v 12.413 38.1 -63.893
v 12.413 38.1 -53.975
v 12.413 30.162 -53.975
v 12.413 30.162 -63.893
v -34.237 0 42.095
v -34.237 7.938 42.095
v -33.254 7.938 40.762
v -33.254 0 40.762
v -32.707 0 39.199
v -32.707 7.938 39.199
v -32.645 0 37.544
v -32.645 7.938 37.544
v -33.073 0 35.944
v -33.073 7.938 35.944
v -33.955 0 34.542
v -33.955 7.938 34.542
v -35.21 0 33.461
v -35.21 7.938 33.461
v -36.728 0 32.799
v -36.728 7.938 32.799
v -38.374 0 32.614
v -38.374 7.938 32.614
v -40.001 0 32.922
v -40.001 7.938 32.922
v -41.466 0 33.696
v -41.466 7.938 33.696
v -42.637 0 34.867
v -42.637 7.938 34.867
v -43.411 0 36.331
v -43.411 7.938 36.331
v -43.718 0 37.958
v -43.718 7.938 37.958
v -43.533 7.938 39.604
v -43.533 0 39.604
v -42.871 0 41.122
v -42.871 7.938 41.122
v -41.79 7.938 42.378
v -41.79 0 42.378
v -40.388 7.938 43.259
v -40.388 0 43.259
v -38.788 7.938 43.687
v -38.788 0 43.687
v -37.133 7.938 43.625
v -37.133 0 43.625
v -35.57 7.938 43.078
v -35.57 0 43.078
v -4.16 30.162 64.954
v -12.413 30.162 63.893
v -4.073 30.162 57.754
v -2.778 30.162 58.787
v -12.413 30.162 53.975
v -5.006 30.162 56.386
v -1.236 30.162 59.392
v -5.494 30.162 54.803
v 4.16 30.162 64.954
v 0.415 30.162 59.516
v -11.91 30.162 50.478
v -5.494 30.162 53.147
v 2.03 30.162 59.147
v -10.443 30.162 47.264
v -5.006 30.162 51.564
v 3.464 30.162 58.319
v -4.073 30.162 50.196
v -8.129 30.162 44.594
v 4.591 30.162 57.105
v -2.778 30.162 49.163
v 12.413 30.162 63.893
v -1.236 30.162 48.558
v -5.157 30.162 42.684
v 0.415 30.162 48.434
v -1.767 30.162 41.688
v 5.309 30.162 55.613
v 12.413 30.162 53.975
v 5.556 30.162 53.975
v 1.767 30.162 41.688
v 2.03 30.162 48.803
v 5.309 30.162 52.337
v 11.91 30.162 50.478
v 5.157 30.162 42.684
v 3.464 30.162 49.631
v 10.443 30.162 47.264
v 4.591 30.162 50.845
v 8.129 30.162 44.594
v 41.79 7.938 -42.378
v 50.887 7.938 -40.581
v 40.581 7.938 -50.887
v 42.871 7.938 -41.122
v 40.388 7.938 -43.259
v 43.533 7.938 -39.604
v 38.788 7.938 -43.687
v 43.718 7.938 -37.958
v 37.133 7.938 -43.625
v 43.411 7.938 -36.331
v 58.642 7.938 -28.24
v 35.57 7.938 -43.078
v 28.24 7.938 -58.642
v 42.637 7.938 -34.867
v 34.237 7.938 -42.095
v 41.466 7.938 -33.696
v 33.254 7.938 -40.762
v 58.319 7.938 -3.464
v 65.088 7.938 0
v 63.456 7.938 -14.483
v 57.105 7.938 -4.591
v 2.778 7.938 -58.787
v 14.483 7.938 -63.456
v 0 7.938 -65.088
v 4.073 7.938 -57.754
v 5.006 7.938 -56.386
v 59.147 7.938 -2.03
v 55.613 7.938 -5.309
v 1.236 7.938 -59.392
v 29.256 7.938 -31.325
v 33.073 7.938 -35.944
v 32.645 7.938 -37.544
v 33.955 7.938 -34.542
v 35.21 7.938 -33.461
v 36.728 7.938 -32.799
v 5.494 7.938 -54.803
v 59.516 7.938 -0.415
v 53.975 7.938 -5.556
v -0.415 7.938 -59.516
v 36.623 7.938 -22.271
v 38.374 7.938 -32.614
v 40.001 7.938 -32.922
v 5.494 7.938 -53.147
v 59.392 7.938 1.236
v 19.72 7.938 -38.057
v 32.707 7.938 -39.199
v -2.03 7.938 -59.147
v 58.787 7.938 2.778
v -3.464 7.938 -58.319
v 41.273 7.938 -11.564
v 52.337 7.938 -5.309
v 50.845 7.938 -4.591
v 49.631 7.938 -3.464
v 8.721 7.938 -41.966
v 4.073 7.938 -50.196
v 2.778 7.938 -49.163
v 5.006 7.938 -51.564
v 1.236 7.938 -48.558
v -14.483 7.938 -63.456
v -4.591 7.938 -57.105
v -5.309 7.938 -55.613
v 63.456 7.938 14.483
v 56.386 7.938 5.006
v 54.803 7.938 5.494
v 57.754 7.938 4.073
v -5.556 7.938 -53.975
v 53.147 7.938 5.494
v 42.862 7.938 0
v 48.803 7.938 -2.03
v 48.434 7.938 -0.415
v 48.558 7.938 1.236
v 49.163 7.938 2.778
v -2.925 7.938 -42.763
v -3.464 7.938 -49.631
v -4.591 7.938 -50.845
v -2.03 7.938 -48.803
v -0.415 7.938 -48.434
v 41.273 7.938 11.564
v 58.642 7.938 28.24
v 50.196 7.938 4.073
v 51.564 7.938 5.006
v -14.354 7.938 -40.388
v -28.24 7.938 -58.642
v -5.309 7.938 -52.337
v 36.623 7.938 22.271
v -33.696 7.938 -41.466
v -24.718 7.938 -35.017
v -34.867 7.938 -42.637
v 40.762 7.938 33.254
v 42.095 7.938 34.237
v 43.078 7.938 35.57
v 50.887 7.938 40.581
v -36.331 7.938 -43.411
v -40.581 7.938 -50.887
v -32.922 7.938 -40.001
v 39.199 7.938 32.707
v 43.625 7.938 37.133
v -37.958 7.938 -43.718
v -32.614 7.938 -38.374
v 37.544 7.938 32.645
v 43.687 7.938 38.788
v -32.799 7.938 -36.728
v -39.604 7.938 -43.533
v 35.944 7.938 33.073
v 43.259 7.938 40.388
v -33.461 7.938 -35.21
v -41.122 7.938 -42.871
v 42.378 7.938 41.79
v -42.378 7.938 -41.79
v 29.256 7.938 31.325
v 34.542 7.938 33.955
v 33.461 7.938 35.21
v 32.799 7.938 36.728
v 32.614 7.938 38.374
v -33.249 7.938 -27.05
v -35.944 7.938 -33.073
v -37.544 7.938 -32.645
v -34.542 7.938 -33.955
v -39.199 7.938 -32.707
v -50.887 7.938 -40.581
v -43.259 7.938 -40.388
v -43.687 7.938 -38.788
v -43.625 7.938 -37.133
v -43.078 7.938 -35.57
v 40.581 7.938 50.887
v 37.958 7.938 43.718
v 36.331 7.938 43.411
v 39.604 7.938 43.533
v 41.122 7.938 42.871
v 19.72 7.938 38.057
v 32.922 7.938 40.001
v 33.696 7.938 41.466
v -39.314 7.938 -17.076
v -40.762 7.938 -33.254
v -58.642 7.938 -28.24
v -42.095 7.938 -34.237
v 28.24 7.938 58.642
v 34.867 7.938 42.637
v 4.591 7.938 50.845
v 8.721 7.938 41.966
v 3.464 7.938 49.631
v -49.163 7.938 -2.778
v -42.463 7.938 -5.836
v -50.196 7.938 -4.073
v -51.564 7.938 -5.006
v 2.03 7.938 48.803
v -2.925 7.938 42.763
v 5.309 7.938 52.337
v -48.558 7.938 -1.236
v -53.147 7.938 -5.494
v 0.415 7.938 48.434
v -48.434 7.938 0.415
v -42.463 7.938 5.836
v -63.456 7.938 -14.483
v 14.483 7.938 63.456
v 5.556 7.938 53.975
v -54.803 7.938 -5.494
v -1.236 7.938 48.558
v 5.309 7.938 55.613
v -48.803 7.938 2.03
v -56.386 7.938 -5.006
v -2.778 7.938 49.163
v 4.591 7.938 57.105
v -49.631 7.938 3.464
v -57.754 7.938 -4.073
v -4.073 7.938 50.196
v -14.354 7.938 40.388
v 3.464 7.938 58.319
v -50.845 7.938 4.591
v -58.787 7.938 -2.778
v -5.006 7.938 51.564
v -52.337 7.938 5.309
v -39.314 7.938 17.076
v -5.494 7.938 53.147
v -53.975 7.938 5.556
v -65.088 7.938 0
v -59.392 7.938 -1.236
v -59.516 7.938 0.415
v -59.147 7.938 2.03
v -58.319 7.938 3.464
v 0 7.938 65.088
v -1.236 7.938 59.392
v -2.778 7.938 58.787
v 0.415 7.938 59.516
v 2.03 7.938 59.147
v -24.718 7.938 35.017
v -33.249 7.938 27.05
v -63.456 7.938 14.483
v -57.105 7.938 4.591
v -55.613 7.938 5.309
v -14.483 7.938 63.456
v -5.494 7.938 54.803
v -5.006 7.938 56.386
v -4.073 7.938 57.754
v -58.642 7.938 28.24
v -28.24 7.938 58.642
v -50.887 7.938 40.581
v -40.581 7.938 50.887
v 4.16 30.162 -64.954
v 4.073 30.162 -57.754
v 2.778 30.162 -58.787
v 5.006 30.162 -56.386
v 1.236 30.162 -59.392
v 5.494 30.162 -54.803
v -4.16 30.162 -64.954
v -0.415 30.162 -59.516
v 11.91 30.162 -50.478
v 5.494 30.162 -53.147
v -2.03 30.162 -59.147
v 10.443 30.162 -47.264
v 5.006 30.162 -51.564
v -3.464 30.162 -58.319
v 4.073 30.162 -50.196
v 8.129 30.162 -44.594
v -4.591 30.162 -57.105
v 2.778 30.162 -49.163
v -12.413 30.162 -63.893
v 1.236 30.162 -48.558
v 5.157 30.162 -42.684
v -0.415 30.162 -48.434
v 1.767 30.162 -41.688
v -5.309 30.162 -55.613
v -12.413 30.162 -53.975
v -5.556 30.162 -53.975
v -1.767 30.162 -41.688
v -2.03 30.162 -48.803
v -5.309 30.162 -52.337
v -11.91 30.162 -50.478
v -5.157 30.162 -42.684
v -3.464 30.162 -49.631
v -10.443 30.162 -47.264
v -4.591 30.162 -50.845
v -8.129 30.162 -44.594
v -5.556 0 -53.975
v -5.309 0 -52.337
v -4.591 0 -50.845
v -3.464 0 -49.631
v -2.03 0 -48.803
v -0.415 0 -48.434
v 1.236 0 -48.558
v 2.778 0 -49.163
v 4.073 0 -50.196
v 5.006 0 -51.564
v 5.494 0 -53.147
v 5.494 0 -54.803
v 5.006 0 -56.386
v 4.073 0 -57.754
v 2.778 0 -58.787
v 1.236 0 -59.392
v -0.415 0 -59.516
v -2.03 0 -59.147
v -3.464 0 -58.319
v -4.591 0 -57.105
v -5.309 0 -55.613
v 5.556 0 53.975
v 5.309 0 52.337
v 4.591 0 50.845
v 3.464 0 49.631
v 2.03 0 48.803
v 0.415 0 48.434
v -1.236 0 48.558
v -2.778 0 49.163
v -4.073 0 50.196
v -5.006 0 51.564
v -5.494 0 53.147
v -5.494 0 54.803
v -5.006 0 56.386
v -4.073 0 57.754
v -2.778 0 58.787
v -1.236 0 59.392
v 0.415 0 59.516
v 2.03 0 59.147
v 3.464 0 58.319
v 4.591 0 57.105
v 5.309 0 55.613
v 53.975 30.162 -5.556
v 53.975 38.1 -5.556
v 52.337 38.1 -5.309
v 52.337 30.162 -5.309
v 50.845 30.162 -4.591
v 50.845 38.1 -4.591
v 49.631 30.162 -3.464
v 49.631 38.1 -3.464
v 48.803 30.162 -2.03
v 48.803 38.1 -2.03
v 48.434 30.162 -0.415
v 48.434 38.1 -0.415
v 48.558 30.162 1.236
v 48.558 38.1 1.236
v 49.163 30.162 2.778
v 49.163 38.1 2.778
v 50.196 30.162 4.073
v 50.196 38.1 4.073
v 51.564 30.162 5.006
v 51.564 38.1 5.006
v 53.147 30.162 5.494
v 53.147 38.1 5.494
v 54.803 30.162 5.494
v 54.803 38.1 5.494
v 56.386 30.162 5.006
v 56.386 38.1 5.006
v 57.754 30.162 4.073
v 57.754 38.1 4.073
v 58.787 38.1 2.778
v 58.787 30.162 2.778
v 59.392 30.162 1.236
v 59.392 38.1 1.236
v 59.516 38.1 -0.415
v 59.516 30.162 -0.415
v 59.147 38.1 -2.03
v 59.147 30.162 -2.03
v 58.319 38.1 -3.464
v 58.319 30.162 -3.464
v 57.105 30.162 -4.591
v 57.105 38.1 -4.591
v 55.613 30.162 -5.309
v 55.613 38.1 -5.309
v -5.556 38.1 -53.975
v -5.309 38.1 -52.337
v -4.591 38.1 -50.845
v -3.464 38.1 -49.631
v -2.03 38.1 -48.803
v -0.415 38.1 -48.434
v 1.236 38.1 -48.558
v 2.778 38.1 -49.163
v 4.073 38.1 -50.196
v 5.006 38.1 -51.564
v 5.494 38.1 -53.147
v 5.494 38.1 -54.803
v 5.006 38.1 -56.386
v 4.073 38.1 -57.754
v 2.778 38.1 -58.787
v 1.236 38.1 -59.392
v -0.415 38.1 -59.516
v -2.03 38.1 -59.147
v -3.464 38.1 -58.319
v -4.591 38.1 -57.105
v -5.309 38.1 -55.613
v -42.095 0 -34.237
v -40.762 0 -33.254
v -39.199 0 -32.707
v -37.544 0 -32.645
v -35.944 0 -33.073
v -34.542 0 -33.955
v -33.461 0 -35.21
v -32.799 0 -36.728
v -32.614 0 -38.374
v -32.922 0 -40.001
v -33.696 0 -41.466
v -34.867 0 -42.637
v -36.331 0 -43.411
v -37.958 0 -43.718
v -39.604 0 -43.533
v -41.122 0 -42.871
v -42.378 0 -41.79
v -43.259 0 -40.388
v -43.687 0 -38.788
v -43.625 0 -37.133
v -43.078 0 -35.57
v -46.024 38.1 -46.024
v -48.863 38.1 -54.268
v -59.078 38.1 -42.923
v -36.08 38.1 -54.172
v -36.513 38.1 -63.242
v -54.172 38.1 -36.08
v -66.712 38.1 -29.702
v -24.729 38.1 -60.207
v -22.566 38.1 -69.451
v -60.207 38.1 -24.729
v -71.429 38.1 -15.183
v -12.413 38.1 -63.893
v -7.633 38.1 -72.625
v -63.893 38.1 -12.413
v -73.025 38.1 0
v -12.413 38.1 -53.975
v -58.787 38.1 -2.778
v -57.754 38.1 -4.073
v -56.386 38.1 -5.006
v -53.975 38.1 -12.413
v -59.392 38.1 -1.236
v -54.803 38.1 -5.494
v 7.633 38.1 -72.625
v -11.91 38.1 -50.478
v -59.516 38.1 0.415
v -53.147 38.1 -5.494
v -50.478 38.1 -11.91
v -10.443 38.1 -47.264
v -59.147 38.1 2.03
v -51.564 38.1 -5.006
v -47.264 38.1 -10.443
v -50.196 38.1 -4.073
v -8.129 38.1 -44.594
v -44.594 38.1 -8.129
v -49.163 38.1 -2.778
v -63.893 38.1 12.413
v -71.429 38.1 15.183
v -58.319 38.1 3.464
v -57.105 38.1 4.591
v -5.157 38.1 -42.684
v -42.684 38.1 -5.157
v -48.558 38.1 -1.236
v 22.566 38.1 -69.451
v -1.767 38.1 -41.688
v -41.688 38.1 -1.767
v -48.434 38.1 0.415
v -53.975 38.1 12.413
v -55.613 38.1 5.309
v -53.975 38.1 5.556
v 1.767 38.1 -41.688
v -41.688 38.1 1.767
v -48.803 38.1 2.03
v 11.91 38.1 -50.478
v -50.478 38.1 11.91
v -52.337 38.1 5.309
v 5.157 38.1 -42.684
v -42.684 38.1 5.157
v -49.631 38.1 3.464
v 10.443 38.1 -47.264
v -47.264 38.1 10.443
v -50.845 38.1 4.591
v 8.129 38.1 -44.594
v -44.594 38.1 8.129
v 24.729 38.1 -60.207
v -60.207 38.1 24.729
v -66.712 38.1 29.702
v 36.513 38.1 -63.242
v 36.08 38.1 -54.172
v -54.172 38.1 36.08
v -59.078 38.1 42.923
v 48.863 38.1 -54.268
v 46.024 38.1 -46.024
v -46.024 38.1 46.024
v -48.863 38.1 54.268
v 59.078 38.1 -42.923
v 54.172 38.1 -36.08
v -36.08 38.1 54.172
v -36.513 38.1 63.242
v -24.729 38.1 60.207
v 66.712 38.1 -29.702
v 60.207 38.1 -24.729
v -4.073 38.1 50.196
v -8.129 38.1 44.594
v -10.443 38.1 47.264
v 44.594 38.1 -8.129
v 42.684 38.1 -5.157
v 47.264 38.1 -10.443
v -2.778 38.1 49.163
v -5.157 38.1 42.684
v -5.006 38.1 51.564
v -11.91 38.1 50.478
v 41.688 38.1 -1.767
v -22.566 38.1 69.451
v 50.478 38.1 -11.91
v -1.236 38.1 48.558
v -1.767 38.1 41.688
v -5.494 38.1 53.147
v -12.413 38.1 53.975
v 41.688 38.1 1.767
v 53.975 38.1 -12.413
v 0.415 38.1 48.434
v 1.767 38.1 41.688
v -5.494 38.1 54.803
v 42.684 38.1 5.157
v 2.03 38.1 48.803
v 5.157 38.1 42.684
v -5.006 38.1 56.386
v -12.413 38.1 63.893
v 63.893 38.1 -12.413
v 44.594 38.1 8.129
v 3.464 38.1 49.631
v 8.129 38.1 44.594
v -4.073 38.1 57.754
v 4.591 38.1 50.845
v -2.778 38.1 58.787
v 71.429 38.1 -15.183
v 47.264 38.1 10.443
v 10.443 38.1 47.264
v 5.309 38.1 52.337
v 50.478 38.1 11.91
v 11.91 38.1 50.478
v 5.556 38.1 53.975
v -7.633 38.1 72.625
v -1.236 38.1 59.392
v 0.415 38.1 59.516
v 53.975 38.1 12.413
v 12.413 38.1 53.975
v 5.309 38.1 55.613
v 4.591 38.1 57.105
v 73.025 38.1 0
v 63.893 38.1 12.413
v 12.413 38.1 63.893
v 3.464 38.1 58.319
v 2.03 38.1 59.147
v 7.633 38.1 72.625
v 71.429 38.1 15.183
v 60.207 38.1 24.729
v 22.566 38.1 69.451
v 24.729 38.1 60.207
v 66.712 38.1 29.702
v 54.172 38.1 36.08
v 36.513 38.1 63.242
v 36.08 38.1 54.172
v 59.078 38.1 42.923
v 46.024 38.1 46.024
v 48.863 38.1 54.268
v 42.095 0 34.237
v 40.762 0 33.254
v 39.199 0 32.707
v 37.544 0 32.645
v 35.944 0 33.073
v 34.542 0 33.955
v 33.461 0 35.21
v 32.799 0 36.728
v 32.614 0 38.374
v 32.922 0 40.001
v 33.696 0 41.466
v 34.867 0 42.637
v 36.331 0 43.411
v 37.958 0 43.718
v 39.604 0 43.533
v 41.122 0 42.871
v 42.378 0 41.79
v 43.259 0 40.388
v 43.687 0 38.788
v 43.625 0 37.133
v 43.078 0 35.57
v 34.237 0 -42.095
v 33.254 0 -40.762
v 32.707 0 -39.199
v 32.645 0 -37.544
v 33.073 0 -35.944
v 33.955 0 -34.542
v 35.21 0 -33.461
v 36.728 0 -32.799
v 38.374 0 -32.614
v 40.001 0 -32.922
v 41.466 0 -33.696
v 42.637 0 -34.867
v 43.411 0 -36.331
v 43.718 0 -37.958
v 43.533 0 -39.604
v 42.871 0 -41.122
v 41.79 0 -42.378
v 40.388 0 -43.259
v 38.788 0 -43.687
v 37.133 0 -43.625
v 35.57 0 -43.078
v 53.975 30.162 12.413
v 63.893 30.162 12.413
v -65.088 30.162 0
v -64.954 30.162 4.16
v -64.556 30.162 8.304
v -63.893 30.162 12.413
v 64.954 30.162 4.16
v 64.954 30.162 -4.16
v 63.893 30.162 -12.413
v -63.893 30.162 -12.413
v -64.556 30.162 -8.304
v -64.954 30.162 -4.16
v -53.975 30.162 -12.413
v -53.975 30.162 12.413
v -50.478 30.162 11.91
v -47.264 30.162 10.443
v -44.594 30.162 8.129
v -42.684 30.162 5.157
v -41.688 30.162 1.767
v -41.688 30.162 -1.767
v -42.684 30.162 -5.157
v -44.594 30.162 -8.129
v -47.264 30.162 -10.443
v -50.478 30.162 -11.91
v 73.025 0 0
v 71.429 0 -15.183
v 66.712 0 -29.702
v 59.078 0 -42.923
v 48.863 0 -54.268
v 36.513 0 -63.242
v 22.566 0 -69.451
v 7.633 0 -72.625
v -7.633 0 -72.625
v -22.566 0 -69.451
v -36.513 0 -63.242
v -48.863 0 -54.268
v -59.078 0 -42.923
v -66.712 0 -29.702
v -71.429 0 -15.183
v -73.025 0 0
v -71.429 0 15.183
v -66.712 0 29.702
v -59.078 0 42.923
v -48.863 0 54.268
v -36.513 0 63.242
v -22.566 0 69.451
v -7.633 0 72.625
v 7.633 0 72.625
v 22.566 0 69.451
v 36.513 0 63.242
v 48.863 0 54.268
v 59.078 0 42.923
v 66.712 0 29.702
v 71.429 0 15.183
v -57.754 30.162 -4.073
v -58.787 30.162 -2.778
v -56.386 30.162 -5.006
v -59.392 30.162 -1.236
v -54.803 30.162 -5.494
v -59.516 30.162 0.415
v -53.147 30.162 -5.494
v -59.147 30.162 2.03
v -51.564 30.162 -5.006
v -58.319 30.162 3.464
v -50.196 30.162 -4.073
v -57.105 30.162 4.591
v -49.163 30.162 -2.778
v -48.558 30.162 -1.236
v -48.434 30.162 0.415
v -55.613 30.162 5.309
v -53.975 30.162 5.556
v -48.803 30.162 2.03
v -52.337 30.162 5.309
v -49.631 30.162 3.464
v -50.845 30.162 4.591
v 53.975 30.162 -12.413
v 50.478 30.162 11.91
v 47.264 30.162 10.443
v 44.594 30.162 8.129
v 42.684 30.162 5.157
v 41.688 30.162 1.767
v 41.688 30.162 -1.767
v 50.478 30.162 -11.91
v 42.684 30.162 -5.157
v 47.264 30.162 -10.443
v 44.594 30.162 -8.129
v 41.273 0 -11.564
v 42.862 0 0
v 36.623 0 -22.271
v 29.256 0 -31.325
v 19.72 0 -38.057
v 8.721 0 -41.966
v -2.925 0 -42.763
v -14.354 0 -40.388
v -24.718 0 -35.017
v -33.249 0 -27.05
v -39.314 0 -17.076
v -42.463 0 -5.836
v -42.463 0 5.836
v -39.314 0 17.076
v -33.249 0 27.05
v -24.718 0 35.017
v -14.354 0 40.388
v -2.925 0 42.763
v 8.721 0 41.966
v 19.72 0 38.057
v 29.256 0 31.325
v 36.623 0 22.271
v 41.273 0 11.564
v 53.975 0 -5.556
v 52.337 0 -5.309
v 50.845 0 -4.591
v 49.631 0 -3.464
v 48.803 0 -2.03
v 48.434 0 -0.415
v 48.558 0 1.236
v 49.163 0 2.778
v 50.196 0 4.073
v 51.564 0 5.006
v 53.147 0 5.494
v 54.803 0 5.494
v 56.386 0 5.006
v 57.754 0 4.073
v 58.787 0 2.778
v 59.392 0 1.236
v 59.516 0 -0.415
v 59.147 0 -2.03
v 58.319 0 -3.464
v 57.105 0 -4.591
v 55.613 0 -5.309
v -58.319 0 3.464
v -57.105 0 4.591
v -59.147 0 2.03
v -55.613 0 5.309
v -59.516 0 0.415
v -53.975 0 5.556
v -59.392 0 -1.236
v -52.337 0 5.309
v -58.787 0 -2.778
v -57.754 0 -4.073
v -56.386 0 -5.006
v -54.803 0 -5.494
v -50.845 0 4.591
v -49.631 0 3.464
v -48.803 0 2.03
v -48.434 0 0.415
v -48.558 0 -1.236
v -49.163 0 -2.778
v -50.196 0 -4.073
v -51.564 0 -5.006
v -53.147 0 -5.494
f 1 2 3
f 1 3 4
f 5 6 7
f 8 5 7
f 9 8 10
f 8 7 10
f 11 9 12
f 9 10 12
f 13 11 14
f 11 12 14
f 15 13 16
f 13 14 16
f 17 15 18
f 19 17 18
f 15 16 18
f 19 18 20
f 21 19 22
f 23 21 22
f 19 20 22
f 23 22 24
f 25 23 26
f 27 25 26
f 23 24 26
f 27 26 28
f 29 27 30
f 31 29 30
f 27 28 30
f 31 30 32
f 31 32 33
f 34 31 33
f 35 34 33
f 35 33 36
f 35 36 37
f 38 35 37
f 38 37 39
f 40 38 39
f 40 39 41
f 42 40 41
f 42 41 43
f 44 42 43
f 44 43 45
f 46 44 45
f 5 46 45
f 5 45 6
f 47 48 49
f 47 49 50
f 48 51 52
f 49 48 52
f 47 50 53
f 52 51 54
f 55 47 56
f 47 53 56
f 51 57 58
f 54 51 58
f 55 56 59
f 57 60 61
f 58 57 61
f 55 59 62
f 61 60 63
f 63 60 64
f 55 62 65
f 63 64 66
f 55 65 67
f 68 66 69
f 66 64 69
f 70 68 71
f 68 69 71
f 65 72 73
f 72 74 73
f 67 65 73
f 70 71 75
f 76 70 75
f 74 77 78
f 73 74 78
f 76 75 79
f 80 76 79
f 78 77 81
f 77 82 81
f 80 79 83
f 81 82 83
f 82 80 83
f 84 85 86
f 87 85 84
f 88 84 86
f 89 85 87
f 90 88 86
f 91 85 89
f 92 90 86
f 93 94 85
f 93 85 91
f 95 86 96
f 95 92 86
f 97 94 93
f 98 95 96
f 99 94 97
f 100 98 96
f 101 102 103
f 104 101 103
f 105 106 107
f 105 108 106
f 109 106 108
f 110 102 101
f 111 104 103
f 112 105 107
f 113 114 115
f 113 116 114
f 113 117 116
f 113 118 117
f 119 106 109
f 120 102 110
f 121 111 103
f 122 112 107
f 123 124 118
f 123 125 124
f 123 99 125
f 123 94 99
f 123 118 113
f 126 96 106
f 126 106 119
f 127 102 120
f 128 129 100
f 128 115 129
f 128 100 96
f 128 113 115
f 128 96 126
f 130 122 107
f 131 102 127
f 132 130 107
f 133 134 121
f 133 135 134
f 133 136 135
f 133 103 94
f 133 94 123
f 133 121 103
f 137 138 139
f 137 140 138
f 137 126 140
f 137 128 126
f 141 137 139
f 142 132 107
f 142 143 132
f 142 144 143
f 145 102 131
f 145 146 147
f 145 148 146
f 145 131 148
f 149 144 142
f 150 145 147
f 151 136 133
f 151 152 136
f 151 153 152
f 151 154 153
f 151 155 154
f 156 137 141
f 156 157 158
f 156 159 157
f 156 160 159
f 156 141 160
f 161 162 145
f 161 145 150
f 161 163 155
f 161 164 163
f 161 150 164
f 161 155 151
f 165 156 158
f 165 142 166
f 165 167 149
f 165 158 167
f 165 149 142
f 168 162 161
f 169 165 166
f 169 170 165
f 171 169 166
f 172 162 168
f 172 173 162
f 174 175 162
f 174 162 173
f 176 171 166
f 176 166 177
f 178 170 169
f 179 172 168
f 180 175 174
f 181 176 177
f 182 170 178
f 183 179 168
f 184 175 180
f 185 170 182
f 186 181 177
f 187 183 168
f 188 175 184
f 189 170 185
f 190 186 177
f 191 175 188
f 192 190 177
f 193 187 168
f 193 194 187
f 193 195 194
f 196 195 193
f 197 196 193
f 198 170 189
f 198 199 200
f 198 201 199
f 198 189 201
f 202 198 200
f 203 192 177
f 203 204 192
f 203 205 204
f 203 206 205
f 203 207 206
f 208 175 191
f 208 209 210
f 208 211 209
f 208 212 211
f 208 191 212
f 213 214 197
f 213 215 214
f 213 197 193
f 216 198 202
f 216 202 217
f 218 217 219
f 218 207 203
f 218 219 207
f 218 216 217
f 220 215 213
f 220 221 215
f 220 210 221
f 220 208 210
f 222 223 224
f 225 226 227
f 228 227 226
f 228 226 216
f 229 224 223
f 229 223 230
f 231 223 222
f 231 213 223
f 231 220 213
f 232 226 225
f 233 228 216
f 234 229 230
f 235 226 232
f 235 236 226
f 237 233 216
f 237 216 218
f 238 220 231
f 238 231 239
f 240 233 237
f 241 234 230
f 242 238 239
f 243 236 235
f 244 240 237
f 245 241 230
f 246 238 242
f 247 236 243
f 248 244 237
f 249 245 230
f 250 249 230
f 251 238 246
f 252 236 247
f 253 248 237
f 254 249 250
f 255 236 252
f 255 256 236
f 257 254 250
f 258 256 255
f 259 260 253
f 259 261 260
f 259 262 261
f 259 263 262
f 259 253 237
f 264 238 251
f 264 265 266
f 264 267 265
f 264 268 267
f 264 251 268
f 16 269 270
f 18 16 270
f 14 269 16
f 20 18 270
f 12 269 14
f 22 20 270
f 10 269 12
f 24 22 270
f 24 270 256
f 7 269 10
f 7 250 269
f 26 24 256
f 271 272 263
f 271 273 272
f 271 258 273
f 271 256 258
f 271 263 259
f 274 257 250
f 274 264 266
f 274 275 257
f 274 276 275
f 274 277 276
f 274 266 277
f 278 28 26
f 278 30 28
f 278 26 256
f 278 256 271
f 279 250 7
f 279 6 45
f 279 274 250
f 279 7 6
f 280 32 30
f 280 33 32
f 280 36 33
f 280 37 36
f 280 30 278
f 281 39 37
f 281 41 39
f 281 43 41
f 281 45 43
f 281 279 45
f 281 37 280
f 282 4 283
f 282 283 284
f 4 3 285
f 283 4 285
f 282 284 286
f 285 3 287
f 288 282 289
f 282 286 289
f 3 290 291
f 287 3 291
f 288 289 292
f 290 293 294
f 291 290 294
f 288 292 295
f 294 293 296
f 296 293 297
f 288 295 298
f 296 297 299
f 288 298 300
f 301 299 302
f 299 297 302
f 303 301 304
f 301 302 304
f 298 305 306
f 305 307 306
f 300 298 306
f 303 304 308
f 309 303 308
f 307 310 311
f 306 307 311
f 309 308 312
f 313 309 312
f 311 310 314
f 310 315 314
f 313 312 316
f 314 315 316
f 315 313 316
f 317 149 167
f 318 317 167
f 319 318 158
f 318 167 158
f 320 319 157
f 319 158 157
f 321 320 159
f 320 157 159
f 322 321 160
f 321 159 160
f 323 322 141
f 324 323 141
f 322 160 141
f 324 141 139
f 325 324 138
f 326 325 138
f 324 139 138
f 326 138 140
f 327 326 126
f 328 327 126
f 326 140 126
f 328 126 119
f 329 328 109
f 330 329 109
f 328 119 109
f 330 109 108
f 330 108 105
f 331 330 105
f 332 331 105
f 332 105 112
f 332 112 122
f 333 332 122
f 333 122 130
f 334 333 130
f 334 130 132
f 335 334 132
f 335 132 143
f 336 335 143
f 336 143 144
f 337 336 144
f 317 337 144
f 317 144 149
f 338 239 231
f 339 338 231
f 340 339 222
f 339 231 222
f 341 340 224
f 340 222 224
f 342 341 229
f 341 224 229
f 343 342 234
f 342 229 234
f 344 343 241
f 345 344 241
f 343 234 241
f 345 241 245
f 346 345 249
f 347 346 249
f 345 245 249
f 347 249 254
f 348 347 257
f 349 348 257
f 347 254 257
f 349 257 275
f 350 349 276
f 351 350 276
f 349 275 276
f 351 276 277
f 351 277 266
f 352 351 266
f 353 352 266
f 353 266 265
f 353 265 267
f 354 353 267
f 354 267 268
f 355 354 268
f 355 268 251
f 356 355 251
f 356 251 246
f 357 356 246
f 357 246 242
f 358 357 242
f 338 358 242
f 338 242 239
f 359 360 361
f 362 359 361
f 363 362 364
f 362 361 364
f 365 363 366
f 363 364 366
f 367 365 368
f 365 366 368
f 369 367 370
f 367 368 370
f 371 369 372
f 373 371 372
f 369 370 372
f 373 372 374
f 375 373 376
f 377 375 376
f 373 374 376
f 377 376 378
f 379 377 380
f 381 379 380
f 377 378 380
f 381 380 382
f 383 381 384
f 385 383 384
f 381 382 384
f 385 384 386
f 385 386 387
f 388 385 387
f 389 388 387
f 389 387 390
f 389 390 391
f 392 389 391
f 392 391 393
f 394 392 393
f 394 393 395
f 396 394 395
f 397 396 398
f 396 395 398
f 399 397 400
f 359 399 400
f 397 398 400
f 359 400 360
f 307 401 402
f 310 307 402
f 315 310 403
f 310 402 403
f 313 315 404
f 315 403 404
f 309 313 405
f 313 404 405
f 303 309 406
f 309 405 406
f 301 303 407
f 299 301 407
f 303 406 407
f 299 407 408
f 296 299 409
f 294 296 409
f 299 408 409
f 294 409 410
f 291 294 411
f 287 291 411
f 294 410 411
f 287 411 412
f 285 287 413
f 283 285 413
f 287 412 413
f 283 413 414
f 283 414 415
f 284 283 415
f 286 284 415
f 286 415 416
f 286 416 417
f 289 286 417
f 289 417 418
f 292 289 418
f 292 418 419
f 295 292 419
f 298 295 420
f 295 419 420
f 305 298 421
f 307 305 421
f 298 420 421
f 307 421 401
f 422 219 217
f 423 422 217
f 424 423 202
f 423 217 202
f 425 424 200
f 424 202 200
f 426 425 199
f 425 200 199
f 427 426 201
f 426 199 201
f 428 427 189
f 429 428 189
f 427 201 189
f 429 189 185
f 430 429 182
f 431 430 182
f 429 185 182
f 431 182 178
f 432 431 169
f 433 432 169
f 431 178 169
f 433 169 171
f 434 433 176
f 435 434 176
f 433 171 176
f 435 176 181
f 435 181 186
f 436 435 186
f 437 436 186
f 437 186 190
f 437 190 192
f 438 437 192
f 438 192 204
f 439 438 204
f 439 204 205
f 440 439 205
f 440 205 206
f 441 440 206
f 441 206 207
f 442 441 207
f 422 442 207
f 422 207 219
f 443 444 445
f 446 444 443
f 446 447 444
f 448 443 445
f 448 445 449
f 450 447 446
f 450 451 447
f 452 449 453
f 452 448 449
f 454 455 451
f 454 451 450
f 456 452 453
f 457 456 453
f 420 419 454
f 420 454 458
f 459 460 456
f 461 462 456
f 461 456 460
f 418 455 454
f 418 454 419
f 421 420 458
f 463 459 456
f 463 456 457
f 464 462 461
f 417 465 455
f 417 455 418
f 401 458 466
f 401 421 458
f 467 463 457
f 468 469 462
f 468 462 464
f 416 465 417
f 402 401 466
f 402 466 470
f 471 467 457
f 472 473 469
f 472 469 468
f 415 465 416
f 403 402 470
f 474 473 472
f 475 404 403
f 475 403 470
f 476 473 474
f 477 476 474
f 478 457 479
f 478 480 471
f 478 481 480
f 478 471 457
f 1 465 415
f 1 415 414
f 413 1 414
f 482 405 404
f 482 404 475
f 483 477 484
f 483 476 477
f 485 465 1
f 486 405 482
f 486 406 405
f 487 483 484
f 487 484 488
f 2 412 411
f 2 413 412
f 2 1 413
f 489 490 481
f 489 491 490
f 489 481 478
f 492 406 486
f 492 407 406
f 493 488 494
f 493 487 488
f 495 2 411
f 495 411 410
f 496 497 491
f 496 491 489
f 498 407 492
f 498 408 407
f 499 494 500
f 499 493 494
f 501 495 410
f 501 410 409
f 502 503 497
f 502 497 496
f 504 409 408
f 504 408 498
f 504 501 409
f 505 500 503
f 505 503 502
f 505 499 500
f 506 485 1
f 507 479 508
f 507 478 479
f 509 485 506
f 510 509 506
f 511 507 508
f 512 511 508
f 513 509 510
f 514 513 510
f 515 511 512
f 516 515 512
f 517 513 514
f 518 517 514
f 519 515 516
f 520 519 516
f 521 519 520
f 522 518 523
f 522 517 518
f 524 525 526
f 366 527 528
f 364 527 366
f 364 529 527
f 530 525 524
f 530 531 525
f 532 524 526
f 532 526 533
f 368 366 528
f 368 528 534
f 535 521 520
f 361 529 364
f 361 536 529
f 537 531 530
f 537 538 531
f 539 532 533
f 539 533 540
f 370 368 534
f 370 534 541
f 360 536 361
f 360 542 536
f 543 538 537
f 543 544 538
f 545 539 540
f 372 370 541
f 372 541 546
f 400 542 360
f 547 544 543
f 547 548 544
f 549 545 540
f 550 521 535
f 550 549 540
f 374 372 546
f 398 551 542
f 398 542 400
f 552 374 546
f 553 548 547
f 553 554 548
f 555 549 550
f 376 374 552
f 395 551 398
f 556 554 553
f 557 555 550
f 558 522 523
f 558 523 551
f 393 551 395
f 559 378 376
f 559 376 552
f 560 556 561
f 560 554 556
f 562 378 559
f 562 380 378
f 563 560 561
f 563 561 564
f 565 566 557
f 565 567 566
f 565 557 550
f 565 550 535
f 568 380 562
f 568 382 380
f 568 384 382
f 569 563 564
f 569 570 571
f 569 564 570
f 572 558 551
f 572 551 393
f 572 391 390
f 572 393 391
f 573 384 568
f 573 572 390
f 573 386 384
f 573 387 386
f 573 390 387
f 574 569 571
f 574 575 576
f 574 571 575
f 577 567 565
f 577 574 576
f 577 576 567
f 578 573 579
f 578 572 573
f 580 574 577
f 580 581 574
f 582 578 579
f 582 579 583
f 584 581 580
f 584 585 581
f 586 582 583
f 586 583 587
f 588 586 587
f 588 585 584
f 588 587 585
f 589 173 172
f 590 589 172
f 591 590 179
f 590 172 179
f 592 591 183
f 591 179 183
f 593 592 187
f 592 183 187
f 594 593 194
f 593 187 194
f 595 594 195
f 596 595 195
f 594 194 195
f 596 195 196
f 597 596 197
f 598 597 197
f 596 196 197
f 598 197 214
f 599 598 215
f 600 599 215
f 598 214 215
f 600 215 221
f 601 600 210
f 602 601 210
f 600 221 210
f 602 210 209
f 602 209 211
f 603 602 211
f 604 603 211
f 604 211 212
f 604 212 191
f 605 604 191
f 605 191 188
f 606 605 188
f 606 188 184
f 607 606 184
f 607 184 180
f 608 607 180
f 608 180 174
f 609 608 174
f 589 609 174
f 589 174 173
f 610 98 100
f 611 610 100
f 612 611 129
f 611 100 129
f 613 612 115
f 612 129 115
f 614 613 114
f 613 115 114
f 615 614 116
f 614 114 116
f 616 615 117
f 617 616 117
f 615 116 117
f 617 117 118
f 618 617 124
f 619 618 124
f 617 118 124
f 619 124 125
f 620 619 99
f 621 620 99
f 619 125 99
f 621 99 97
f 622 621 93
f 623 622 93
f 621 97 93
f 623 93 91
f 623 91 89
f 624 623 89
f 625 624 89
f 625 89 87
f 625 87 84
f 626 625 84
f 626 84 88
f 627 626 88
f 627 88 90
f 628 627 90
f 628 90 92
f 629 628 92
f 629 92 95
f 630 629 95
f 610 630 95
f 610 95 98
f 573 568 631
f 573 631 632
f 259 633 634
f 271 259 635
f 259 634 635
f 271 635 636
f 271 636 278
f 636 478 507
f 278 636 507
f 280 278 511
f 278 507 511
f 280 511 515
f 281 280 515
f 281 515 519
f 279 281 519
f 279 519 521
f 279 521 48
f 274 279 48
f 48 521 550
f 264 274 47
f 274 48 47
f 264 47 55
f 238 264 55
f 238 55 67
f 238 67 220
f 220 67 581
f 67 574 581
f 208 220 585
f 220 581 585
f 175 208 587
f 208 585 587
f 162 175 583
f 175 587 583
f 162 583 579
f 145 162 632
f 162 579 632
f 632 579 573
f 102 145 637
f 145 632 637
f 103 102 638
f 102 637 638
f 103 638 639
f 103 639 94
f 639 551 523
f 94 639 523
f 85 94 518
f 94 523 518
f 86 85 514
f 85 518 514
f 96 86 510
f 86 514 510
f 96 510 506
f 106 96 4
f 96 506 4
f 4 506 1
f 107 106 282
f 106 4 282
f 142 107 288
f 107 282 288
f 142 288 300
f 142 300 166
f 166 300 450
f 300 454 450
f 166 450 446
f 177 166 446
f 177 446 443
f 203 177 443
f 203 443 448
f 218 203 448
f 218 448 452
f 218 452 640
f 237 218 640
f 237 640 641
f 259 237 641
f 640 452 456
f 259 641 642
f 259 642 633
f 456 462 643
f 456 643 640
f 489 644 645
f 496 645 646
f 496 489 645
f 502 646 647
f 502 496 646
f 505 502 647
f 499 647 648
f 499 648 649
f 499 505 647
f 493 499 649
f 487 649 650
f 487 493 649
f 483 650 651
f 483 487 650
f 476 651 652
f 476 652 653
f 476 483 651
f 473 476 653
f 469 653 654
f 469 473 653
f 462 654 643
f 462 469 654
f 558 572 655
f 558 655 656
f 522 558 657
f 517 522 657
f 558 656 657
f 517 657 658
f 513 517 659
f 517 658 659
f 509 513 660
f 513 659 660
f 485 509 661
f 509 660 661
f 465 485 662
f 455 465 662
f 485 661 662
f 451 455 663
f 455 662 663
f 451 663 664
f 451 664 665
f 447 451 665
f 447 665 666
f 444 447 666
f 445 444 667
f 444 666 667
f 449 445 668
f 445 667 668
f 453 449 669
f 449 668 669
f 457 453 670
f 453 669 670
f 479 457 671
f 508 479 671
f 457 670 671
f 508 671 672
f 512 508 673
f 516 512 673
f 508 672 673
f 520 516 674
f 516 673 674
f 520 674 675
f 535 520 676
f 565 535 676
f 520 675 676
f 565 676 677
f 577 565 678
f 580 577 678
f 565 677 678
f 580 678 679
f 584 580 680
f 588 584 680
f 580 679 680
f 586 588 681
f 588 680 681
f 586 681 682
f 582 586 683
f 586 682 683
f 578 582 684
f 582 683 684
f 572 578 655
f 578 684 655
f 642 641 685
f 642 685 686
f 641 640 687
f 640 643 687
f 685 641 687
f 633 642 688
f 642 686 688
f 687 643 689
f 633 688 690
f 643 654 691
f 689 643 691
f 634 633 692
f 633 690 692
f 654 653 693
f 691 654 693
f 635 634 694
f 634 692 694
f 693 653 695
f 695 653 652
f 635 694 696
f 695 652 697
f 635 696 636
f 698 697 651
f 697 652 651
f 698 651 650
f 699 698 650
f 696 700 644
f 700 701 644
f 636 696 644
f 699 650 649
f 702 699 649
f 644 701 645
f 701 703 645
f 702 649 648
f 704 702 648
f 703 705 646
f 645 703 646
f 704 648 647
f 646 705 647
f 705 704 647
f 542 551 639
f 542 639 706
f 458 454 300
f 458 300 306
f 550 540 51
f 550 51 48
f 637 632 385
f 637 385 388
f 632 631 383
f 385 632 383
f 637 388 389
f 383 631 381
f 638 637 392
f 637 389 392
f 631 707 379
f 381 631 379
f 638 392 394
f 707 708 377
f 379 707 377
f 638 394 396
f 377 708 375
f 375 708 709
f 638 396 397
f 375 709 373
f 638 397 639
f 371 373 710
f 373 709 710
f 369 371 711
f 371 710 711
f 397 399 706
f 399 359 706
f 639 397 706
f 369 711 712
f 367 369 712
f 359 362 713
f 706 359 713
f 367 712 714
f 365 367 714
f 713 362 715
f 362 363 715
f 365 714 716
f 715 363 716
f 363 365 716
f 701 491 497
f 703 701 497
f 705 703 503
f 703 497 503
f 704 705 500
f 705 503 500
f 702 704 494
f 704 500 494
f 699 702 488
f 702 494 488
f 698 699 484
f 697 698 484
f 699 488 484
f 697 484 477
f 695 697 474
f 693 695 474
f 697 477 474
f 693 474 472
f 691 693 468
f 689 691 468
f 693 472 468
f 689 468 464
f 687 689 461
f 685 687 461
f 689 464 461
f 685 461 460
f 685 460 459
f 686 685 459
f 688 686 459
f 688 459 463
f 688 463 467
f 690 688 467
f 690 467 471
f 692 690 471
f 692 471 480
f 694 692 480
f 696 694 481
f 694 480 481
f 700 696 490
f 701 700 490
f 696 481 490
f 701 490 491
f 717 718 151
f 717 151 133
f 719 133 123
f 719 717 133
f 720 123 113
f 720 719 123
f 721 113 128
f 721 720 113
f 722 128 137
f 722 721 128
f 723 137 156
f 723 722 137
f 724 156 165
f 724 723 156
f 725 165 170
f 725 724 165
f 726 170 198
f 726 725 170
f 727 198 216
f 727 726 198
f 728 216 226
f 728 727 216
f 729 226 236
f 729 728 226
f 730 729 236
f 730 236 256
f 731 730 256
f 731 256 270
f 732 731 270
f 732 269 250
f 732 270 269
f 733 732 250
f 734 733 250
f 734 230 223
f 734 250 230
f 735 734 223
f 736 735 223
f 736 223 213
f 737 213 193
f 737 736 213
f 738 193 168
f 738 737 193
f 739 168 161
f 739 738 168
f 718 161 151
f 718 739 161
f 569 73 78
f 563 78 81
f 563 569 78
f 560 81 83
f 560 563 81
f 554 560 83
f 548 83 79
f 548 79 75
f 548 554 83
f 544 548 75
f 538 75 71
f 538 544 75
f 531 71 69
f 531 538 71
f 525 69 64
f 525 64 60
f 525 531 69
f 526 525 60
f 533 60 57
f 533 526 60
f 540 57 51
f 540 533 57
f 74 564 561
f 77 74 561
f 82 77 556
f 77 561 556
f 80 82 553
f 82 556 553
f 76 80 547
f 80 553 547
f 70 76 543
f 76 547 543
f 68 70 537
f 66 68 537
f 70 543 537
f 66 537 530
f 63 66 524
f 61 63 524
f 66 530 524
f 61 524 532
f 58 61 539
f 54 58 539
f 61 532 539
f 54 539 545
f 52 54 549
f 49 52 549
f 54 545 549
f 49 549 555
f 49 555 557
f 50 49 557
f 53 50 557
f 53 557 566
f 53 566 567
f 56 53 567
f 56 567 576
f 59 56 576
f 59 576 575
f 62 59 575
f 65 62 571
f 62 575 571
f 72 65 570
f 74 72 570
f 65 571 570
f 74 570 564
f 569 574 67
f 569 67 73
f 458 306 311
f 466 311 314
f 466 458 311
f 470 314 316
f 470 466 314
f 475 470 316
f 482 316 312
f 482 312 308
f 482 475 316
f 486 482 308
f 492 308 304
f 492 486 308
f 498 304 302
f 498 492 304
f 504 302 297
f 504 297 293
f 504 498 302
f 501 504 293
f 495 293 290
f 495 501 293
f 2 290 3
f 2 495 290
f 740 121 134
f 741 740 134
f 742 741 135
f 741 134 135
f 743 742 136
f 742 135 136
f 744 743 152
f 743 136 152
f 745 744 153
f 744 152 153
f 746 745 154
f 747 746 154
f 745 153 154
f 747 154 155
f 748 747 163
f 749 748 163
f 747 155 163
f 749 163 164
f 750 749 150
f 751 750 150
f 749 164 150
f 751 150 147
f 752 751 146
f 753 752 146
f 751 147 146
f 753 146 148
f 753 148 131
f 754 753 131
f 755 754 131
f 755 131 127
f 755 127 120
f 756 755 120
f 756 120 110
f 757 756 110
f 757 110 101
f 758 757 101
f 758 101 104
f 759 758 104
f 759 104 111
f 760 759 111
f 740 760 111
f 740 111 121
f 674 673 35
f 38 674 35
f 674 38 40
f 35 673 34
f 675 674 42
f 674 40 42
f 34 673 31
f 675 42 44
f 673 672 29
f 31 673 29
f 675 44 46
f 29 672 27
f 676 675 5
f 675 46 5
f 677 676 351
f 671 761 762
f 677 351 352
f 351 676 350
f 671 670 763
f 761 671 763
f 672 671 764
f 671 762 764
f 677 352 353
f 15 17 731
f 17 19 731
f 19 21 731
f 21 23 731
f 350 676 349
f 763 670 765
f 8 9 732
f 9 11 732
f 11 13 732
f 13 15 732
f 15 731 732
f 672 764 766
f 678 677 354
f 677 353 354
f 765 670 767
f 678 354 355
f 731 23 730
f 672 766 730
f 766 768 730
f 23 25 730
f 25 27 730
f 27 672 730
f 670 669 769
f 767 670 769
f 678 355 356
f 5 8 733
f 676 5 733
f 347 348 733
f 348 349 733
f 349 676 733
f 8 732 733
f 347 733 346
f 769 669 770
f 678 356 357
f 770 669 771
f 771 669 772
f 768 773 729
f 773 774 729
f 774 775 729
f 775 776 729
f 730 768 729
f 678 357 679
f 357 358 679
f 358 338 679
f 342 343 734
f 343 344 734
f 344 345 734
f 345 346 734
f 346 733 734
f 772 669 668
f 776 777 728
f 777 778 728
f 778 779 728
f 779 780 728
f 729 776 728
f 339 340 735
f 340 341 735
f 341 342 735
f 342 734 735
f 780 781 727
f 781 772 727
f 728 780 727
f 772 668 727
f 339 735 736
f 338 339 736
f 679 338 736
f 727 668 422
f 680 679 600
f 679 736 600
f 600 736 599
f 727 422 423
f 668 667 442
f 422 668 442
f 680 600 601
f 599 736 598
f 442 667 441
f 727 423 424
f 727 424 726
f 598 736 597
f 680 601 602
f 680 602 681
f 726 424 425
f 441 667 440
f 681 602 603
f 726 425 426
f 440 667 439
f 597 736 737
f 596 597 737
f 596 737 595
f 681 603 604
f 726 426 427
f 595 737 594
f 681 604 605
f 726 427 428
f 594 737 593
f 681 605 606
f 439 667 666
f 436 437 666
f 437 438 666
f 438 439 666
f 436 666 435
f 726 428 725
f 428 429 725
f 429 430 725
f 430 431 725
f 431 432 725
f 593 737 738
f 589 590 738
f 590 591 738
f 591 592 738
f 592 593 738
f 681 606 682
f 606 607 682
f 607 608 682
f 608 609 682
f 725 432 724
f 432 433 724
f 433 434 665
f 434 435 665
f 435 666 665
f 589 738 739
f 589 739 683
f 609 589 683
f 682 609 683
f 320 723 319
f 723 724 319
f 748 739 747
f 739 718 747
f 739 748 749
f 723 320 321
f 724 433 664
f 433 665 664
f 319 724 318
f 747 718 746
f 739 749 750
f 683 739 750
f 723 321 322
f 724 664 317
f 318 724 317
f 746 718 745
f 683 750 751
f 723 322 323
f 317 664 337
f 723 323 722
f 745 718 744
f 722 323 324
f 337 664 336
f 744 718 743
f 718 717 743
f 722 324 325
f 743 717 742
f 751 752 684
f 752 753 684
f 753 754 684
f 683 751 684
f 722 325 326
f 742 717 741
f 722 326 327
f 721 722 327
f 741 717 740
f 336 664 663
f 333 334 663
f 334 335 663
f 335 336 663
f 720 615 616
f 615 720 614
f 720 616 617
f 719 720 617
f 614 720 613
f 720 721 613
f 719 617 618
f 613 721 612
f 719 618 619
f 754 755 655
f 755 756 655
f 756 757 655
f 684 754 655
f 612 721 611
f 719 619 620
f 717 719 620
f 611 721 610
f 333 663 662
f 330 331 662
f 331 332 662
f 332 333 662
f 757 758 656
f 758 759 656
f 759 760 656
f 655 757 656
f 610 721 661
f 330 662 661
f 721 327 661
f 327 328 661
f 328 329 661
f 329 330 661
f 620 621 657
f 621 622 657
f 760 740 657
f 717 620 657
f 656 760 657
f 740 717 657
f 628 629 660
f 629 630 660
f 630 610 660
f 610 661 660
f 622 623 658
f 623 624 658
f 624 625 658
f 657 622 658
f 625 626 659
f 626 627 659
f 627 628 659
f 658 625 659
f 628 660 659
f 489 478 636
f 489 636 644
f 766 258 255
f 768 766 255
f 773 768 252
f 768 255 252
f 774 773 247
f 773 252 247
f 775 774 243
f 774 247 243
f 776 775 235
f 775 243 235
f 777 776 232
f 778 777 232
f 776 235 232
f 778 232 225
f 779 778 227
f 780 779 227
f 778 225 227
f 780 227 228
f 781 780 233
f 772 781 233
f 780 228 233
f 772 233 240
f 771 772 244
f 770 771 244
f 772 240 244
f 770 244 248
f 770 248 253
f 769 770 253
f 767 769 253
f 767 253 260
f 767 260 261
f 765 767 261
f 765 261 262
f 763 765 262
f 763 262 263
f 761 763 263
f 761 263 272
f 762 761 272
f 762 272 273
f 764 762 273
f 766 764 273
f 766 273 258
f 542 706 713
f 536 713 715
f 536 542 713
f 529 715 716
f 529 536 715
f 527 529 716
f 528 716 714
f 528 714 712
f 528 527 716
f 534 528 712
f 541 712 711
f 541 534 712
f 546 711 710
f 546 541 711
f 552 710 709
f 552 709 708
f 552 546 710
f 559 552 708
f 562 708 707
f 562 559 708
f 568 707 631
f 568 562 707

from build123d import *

# Parameters (mm, degrees)
SKETCH1_R          = 73.025
SKETCH1_R_2        = 42.8625
EXTRUDE1_DEPTH     = 38.1
SKETCH2_R          = 65.0875
CUT_EXTRUDE1_DEPTH = 30.1625
SKETCH3_R          = 5.55625
CUT_EXTRUDE2_DEPTH = 30.1625
CIRPATTERN1_COUNT  = 8
SKETCH5_R          = 5.55625
EXTRUDE2_DEPTH     = 7.9375
CIRPATTERN2_COUNT  = 4


with BuildPart() as part:
    # Sketch1 → Extrude1 (new body)
    with BuildSketch(Plane(origin=(0, 0, 0), x_dir=(1, 0, 0), z_dir=(0, 1, 0))):
        Circle(SKETCH1_R)
        Circle(SKETCH1_R_2, mode=Mode.SUBTRACT)
    extrude(amount=EXTRUDE1_DEPTH)

    # Sketch2 → Cut-Extrude1 (cut)
    with BuildSketch(Plane(origin=(0, 38.1, 0), x_dir=(-1, 0, 0), z_dir=(0, 1, 0))):
        Circle(SKETCH2_R)
    extrude(amount=-CUT_EXTRUDE1_DEPTH, mode=Mode.SUBTRACT)

    # Sketch3 → Cut-Extrude2 (cut)
    with BuildSketch(Plane(origin=(0, 7.9375, 0), x_dir=(-1, 0, 0), z_dir=(0, 1, 0))):
        with Locations((0, -53.975)):
            Circle(SKETCH3_R)
    cut_extrude2 = extrude(amount=-CUT_EXTRUDE2_DEPTH, mode=Mode.SUBTRACT)

    # CirPattern1: Cut-Extrude2 ×8 about axis
    cirpattern1_axis = Axis((0, 0, 0), (0, 1, 0))
    for i in range(1, CIRPATTERN1_COUNT):
        add(cut_extrude2.rotate(cirpattern1_axis, i * 360 / CIRPATTERN1_COUNT), mode=Mode.SUBTRACT)

    # Sketch5 → Extrude2 (add)
    with BuildSketch(Plane(origin=(0, 38.1, 0), x_dir=(-1, 0, 0), z_dir=(0, 1, 0))):
        with BuildLine():
            ThreePointArc((-12.413038972, -63.892872214), (0, -65.0875), (12.413038972, -63.892872214))
            Line((12.413038972, -63.892872214), (12.413038972, -53.975))
            ThreePointArc((12.413038972, -53.975), (0, -41.561961028), (-12.413038972, -53.975))
            Line((-12.413038972, -53.975), (-12.413038972, -63.892872214))
        make_face()
        with Locations((0, -53.975)):
            Circle(SKETCH5_R, mode=Mode.SUBTRACT)
    extrude2 = extrude(amount=-EXTRUDE2_DEPTH)

    # CirPattern2: Extrude2 ×4 about axis
    cirpattern2_axis = Axis((0, 0, 0), (0, 1, 0))
    for i in range(1, CIRPATTERN2_COUNT):
        add(extrude2.rotate(cirpattern2_axis, i * 360 / CIRPATTERN2_COUNT))


solid = part.part
